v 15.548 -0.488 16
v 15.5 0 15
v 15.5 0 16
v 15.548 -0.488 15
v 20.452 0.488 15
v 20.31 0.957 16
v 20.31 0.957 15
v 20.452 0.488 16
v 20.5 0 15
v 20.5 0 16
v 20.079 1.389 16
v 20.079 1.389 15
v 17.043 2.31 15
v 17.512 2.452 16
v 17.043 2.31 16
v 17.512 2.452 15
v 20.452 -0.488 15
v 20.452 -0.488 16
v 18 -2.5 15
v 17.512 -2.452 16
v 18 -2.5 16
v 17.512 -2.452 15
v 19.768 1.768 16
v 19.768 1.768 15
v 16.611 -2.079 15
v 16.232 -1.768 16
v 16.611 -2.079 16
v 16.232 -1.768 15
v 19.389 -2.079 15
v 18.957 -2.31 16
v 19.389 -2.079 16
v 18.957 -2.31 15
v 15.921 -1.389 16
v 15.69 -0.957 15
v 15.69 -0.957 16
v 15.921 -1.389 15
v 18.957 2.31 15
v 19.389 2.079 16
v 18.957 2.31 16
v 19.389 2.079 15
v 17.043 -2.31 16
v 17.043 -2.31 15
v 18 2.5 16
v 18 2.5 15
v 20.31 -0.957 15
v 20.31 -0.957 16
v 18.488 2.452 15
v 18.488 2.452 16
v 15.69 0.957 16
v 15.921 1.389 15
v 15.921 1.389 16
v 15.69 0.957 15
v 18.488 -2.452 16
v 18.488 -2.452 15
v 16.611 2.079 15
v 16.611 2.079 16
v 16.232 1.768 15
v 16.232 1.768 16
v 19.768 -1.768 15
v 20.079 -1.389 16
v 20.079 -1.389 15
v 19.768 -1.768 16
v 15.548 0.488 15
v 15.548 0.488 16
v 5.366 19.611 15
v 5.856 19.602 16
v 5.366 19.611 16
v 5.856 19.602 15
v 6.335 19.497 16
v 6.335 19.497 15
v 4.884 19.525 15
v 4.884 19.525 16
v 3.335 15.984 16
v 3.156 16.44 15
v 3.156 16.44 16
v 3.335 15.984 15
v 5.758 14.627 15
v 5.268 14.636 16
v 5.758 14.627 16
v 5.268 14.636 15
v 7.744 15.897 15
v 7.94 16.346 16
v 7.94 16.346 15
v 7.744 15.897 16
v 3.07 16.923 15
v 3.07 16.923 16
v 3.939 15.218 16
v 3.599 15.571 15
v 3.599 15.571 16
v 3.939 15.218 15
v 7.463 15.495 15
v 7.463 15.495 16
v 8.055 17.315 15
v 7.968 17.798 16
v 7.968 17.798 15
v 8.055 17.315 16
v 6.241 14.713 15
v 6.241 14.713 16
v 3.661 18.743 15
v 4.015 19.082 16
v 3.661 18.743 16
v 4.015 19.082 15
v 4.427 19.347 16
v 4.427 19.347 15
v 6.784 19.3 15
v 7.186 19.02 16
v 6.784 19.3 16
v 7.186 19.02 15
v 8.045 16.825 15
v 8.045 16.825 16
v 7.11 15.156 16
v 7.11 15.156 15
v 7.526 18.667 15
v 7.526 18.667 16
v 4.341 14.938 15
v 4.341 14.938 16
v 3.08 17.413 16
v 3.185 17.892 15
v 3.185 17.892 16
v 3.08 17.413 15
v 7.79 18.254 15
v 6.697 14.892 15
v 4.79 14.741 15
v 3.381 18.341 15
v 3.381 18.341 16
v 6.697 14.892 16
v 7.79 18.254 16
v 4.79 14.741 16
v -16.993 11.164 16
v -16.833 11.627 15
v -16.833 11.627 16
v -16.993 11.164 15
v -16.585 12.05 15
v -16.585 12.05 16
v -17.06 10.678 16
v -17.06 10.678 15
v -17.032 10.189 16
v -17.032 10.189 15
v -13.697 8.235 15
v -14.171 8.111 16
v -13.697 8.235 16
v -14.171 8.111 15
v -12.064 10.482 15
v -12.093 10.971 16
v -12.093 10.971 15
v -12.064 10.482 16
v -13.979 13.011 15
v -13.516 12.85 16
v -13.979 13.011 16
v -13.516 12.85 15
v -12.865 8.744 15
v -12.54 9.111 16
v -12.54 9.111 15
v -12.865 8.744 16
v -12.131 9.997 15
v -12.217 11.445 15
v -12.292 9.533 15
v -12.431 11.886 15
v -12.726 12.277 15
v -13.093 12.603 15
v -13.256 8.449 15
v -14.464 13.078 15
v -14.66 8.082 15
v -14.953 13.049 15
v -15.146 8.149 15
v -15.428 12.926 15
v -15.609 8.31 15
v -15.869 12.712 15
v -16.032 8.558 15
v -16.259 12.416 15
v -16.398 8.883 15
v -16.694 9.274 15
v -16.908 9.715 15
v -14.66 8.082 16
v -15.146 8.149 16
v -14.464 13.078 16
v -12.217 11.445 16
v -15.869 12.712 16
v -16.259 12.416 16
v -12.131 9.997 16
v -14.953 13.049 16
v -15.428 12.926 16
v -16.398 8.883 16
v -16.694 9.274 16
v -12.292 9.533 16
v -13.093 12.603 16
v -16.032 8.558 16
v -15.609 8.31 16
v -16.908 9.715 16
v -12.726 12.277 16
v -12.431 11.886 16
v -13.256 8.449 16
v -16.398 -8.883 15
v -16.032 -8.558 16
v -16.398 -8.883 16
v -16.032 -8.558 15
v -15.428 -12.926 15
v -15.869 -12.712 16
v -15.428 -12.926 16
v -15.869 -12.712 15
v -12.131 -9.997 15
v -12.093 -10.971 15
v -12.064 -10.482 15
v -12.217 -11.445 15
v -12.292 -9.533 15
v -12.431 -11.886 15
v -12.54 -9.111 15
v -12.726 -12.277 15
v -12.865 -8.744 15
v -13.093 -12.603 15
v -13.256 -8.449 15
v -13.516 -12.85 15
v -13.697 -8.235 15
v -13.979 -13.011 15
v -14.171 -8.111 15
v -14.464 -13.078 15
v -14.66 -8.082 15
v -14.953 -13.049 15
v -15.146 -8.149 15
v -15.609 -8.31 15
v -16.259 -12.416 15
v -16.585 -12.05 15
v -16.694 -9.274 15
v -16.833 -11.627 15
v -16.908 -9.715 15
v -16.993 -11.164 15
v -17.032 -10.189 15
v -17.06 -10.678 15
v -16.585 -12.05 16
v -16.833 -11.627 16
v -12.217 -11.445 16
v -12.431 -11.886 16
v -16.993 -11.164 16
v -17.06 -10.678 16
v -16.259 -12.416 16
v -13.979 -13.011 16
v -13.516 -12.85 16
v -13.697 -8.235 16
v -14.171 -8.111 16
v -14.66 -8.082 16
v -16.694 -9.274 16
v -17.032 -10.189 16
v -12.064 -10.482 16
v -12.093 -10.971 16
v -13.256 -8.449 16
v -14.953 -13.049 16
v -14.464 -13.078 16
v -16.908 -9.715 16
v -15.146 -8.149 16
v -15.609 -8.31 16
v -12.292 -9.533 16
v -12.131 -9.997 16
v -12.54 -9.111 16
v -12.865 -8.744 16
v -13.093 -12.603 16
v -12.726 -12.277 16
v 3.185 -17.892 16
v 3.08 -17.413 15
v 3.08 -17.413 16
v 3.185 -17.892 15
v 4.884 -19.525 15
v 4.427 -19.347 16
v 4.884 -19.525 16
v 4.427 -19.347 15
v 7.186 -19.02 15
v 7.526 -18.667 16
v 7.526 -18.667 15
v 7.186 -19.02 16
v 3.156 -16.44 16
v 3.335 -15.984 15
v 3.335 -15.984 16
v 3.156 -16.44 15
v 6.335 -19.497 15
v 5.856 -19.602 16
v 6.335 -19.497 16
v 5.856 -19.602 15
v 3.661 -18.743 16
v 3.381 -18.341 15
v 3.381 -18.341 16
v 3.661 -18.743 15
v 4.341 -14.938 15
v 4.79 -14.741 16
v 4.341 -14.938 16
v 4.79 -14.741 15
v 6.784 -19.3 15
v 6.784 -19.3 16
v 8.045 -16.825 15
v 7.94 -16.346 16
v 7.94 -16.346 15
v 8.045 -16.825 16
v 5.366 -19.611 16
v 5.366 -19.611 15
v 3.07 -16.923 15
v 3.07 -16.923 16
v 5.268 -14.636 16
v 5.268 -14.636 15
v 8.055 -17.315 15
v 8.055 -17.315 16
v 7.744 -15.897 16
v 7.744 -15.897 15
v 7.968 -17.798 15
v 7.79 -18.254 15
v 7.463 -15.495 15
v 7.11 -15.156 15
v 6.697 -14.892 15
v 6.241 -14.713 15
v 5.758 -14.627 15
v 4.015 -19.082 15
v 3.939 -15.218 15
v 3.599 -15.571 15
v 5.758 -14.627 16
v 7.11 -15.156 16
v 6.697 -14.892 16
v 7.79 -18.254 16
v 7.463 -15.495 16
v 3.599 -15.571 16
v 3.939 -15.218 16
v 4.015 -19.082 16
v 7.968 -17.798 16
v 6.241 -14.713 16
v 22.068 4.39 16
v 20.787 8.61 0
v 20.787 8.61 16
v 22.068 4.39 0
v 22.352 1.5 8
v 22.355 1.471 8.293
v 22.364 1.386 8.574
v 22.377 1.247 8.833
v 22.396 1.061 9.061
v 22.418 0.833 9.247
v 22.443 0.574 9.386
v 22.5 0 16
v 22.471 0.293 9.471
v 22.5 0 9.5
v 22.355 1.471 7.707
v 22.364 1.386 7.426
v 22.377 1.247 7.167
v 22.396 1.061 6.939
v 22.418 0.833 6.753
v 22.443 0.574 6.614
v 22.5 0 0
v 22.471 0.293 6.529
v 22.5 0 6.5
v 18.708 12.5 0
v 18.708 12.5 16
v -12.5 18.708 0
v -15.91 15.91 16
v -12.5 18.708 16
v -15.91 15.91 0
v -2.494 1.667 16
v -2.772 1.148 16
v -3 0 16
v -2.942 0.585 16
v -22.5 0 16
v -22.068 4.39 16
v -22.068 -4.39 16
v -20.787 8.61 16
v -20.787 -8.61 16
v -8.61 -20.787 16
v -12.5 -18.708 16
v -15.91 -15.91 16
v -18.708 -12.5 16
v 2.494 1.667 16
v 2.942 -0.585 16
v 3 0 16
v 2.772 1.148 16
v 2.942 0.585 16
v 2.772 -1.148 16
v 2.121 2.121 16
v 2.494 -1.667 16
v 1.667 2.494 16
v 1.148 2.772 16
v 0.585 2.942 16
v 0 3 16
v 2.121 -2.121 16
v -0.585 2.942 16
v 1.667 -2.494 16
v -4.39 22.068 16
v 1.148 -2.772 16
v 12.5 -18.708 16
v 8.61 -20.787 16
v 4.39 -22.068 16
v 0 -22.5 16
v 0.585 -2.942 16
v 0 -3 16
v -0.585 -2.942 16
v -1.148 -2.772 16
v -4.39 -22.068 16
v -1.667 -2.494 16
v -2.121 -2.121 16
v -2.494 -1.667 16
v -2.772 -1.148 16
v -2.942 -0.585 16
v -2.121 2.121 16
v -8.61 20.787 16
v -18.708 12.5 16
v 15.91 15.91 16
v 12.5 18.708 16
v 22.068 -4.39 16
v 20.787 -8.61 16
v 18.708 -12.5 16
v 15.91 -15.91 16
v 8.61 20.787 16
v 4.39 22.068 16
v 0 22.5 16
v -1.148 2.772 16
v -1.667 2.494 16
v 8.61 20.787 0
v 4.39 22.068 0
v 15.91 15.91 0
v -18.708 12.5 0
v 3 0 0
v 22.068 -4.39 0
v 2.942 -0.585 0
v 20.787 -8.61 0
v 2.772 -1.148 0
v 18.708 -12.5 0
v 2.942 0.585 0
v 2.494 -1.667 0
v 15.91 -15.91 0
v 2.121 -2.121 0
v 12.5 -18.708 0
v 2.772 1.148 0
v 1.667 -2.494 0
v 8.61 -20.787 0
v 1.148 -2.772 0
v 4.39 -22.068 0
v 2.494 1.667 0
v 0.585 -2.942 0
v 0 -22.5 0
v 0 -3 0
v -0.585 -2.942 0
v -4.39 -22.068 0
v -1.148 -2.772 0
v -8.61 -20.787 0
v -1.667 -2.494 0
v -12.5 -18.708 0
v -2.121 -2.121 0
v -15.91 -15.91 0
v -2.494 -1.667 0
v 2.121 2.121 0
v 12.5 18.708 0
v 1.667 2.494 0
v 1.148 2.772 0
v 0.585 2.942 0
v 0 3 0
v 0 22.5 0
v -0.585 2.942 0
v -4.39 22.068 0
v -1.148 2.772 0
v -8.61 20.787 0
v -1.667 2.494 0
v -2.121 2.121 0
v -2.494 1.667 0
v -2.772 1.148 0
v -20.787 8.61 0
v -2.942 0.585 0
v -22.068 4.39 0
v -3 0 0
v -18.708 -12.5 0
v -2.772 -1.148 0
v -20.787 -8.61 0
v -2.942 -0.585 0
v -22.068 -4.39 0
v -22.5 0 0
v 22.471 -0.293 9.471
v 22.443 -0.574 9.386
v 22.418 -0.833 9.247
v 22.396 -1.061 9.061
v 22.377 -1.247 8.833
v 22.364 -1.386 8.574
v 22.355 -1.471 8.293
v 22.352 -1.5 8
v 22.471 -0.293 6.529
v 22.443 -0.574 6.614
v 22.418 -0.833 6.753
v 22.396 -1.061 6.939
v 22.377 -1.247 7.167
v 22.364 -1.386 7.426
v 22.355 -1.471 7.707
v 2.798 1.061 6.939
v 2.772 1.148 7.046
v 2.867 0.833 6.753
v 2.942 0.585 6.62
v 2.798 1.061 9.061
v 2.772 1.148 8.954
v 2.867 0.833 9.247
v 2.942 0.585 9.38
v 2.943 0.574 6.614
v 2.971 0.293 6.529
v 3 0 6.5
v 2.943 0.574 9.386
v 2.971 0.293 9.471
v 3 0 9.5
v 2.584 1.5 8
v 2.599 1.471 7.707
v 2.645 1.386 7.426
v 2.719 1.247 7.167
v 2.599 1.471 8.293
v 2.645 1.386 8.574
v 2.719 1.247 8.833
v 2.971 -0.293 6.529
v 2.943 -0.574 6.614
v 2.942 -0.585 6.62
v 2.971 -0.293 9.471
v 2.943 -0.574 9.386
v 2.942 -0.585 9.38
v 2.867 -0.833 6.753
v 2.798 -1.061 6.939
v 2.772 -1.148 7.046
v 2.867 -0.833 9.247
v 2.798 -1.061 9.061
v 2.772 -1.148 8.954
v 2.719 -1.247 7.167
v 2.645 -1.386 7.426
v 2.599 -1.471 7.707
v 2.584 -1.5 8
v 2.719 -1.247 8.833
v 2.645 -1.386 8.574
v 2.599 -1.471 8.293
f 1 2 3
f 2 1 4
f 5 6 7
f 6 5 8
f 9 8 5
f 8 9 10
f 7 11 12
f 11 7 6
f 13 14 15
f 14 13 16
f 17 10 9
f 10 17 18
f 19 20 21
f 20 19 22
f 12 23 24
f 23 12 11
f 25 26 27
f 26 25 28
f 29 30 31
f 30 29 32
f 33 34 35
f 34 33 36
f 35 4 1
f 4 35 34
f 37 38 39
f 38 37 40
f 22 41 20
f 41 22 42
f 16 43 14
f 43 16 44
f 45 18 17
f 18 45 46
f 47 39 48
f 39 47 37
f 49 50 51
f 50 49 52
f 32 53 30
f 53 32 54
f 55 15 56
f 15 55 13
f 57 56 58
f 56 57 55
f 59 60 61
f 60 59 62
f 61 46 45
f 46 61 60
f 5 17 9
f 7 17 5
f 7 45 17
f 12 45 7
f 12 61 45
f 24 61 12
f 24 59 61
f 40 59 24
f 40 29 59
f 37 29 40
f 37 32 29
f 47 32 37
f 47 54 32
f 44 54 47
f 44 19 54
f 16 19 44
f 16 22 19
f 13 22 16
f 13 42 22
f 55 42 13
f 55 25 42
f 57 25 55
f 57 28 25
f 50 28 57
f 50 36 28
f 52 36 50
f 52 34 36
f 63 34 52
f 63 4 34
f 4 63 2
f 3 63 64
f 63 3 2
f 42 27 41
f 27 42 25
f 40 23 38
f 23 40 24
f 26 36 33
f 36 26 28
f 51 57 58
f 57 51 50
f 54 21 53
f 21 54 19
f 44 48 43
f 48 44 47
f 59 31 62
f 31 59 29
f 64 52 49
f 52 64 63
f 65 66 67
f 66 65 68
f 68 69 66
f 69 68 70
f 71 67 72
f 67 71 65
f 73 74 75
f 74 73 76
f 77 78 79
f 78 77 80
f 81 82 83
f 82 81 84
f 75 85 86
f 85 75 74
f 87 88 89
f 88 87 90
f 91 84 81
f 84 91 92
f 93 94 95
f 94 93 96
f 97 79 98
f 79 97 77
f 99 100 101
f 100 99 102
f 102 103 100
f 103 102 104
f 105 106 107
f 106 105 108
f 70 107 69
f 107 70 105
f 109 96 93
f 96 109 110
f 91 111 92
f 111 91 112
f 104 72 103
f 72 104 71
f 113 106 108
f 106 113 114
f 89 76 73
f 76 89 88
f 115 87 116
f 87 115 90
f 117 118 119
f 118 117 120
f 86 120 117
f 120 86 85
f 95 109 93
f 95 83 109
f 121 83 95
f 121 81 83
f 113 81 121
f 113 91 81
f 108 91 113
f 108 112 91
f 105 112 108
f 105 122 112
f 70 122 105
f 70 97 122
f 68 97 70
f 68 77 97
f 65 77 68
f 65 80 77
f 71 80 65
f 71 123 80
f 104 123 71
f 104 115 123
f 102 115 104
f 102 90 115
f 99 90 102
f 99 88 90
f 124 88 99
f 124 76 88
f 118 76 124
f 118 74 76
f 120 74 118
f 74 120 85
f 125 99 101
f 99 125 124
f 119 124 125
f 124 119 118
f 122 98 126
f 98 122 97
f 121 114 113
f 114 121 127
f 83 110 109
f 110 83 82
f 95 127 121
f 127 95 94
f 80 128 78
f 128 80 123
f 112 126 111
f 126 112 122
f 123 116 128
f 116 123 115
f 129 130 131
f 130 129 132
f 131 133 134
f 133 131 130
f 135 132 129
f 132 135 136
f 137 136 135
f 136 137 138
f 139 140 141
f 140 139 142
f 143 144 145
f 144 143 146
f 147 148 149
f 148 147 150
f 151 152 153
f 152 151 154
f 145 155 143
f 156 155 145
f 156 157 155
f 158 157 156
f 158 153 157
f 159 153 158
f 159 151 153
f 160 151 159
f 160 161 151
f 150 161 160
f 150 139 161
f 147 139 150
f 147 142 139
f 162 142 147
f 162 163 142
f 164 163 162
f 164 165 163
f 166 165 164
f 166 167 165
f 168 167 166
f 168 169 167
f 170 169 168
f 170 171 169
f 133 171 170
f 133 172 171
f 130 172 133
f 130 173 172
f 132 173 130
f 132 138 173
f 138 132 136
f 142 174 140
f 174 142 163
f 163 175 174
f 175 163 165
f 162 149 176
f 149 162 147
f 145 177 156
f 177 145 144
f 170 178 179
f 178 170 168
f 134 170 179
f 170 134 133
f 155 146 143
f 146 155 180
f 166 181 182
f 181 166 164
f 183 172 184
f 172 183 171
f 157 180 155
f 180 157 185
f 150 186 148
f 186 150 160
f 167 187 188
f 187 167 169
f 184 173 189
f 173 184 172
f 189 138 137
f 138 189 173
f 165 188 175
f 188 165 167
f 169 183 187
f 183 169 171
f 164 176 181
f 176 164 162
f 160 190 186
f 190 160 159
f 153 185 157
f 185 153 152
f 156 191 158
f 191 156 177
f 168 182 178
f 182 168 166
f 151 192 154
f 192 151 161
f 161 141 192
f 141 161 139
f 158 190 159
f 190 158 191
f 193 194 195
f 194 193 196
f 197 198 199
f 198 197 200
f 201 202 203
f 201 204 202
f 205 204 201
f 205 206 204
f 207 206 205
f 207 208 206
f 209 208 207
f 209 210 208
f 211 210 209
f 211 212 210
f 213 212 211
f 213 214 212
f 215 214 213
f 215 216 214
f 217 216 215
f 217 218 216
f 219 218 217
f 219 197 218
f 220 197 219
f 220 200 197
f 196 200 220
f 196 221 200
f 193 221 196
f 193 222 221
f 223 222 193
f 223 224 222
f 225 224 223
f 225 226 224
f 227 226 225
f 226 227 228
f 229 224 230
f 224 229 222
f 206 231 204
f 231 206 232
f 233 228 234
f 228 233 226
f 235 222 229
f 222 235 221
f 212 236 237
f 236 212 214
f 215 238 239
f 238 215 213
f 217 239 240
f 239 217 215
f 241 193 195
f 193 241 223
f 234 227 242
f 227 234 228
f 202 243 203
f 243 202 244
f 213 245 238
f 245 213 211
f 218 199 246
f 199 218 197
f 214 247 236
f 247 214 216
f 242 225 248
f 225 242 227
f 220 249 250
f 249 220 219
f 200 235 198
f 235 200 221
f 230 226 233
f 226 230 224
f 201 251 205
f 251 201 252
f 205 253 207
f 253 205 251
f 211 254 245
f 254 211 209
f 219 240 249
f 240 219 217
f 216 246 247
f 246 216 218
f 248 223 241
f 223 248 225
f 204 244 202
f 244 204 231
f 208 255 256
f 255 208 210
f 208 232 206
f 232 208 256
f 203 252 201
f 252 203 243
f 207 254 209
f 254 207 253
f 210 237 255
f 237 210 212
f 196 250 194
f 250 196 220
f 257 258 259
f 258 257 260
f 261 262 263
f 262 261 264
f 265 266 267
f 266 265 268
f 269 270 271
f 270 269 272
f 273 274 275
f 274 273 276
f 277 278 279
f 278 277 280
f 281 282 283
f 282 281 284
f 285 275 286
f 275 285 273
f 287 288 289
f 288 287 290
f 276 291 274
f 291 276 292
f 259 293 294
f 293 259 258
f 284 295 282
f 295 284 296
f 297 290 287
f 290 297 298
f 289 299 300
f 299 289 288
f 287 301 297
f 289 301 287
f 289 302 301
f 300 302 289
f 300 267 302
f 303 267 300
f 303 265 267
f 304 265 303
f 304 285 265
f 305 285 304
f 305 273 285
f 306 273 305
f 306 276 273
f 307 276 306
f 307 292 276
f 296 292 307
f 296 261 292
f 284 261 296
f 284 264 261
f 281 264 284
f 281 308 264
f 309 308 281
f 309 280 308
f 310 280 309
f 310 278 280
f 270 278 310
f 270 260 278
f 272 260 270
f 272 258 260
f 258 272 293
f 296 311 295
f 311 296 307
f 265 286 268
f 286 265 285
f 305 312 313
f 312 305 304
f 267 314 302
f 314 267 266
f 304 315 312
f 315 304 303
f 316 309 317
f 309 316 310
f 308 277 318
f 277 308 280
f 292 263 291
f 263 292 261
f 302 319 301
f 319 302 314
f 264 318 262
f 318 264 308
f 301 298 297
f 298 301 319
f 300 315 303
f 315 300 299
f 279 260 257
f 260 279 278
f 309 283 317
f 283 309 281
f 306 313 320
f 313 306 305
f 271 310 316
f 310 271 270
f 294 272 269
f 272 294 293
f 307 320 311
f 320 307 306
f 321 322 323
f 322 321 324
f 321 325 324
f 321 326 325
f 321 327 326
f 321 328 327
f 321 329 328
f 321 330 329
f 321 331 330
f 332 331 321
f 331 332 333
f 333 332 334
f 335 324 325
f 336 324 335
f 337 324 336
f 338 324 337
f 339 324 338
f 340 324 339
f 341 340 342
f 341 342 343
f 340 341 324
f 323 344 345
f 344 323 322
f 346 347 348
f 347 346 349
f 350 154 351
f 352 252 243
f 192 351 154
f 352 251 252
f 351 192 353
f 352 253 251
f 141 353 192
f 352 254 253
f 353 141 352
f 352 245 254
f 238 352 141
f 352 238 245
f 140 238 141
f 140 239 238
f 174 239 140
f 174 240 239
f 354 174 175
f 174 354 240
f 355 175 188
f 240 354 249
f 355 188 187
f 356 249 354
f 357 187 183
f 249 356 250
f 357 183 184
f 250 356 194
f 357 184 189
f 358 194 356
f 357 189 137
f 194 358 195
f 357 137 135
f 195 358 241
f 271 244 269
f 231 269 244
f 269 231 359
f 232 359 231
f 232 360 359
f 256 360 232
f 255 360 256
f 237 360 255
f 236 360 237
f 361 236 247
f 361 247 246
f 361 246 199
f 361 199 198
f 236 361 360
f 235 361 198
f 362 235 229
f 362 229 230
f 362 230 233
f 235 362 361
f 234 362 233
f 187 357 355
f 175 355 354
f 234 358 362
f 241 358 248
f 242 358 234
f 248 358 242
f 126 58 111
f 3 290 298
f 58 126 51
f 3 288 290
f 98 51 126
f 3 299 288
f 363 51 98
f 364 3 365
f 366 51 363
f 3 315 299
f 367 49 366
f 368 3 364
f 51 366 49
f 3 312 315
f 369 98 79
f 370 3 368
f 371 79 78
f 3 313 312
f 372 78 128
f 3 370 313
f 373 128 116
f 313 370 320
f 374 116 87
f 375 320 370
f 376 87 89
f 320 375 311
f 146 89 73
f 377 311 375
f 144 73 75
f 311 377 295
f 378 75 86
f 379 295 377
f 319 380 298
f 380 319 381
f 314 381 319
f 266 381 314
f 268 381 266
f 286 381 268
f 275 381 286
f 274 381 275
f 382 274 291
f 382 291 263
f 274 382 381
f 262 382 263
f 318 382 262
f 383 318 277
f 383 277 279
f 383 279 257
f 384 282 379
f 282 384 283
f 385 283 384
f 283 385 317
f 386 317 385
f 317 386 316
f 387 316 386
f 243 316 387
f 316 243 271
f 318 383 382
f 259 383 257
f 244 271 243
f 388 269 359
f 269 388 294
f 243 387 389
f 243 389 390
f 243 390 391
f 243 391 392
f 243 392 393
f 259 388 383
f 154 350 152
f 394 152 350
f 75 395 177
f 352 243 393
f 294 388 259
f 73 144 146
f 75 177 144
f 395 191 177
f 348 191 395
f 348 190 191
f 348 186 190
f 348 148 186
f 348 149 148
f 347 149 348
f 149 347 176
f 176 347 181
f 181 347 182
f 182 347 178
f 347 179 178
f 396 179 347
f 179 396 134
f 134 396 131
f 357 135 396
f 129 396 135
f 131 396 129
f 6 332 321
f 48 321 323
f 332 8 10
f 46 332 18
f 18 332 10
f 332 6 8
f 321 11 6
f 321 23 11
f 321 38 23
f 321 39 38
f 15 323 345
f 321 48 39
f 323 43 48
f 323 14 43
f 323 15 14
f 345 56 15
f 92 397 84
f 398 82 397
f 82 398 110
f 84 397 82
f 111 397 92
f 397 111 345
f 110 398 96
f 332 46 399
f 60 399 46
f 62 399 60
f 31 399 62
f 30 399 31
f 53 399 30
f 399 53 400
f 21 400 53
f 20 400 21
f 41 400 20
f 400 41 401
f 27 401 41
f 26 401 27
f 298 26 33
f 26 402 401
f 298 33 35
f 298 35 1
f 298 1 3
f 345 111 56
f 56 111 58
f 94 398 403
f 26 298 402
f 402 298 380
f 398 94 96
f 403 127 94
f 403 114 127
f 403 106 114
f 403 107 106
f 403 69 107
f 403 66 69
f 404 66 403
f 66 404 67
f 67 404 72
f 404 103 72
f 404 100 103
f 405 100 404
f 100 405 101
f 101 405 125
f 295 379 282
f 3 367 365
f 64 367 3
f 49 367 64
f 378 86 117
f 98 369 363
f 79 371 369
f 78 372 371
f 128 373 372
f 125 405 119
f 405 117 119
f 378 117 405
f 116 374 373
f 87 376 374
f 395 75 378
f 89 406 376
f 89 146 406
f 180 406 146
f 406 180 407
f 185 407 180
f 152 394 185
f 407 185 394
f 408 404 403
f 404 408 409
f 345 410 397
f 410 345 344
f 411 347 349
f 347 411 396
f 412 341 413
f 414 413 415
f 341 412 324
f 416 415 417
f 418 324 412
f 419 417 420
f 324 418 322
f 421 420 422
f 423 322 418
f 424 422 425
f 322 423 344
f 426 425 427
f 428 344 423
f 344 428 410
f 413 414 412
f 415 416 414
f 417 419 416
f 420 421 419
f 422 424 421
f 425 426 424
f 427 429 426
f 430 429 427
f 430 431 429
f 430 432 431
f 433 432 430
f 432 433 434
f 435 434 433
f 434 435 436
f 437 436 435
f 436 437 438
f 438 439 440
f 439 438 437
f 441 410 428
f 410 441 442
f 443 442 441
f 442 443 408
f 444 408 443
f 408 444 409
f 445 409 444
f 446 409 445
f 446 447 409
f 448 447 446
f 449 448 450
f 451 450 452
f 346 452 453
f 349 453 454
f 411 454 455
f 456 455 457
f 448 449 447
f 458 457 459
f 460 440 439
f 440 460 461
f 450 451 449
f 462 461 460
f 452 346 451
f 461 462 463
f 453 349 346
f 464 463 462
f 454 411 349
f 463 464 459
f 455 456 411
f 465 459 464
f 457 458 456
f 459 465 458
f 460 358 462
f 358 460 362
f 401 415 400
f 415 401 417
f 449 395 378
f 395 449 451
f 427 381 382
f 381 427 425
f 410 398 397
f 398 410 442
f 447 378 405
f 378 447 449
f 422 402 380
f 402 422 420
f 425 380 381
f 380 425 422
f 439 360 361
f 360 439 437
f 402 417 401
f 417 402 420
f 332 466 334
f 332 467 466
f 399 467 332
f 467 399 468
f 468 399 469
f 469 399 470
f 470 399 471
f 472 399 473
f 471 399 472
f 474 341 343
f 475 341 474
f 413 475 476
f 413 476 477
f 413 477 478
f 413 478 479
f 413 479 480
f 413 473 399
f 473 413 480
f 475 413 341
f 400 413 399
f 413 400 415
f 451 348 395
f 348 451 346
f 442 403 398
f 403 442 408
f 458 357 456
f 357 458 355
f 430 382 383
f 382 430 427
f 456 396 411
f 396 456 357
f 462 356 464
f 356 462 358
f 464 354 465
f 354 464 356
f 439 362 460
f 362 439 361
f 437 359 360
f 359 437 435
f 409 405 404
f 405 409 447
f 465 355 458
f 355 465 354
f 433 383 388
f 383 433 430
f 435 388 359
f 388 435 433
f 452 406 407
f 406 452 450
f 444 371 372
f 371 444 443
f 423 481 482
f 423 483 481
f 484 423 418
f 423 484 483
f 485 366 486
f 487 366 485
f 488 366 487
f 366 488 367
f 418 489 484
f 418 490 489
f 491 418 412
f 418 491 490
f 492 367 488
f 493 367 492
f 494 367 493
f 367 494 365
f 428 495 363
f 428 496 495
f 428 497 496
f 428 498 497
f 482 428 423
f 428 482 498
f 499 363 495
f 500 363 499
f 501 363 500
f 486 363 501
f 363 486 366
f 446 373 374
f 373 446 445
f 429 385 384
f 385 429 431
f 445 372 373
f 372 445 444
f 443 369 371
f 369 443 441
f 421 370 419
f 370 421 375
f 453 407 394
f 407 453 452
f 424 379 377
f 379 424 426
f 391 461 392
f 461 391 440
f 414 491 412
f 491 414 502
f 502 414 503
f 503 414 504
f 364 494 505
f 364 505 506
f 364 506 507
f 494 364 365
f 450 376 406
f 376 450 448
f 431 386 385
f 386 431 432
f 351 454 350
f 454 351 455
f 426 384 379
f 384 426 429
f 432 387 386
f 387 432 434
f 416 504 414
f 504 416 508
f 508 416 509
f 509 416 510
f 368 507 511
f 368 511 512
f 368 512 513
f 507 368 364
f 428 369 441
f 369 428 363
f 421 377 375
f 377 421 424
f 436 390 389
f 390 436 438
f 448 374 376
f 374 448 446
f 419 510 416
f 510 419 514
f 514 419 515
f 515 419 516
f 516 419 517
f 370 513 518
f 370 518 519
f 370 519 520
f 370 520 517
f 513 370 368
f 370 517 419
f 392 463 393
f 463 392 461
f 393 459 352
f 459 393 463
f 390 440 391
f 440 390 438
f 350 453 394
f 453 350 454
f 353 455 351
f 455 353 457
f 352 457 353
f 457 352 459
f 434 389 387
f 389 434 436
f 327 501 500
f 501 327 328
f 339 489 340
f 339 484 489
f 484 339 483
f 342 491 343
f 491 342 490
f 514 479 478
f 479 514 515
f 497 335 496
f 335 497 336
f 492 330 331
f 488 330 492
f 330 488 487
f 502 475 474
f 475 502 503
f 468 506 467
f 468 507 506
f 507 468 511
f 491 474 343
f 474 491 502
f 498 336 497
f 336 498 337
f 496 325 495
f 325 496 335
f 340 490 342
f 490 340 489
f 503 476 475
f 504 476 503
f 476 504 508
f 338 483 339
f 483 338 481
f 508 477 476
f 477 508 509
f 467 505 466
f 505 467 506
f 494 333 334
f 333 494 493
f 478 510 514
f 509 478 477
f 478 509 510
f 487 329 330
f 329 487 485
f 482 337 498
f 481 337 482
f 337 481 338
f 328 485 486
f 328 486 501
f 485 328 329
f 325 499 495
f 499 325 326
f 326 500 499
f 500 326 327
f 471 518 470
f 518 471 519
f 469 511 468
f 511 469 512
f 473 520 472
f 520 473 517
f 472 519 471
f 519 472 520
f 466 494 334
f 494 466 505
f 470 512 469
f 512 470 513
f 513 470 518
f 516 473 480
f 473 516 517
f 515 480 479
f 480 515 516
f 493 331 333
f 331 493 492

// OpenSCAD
$fn = 32;

// ----------------------------------------------------------------------
// Control knob: dimpled knob
// ----------------------------------------------------------------------

// --- parameters (mm) ---
dimp_d = 5;               // finger dimple diameter
n_dimp = 5;               // number of dimples
dimp_r = 18;              // dimple ring radius
knob_d = 45;              // knob body diameter
knob_h = 16;              // knob body height
bore_d = 6;               // shaft bore diameter
set_d = 3;                // set screw bore diameter
fit_tol = 0.05;           // tolerance for press fits, mm
free_tol = 0.3;           // tolerance for clearance fits, mm

dimp_step = 360 / n_dimp;  // dimple angular step

difference() {
  cylinder(h = knob_h, d = knob_d);
  translate([0, 0, -1]) cylinder(h = knob_h + 2, d = bore_d);
  translate([-1, 0, knob_h / 2]) rotate([0, 90, 0])
    cylinder(h = knob_d / 2 + bore_d / 2 + 2, d = set_d);  for (i = [0 : n_dimp - 1])
    rotate([0, 0, i * dimp_step])
      translate([dimp_r, 0, knob_h - 1])
        cylinder(h = 2, d = dimp_d);
}
